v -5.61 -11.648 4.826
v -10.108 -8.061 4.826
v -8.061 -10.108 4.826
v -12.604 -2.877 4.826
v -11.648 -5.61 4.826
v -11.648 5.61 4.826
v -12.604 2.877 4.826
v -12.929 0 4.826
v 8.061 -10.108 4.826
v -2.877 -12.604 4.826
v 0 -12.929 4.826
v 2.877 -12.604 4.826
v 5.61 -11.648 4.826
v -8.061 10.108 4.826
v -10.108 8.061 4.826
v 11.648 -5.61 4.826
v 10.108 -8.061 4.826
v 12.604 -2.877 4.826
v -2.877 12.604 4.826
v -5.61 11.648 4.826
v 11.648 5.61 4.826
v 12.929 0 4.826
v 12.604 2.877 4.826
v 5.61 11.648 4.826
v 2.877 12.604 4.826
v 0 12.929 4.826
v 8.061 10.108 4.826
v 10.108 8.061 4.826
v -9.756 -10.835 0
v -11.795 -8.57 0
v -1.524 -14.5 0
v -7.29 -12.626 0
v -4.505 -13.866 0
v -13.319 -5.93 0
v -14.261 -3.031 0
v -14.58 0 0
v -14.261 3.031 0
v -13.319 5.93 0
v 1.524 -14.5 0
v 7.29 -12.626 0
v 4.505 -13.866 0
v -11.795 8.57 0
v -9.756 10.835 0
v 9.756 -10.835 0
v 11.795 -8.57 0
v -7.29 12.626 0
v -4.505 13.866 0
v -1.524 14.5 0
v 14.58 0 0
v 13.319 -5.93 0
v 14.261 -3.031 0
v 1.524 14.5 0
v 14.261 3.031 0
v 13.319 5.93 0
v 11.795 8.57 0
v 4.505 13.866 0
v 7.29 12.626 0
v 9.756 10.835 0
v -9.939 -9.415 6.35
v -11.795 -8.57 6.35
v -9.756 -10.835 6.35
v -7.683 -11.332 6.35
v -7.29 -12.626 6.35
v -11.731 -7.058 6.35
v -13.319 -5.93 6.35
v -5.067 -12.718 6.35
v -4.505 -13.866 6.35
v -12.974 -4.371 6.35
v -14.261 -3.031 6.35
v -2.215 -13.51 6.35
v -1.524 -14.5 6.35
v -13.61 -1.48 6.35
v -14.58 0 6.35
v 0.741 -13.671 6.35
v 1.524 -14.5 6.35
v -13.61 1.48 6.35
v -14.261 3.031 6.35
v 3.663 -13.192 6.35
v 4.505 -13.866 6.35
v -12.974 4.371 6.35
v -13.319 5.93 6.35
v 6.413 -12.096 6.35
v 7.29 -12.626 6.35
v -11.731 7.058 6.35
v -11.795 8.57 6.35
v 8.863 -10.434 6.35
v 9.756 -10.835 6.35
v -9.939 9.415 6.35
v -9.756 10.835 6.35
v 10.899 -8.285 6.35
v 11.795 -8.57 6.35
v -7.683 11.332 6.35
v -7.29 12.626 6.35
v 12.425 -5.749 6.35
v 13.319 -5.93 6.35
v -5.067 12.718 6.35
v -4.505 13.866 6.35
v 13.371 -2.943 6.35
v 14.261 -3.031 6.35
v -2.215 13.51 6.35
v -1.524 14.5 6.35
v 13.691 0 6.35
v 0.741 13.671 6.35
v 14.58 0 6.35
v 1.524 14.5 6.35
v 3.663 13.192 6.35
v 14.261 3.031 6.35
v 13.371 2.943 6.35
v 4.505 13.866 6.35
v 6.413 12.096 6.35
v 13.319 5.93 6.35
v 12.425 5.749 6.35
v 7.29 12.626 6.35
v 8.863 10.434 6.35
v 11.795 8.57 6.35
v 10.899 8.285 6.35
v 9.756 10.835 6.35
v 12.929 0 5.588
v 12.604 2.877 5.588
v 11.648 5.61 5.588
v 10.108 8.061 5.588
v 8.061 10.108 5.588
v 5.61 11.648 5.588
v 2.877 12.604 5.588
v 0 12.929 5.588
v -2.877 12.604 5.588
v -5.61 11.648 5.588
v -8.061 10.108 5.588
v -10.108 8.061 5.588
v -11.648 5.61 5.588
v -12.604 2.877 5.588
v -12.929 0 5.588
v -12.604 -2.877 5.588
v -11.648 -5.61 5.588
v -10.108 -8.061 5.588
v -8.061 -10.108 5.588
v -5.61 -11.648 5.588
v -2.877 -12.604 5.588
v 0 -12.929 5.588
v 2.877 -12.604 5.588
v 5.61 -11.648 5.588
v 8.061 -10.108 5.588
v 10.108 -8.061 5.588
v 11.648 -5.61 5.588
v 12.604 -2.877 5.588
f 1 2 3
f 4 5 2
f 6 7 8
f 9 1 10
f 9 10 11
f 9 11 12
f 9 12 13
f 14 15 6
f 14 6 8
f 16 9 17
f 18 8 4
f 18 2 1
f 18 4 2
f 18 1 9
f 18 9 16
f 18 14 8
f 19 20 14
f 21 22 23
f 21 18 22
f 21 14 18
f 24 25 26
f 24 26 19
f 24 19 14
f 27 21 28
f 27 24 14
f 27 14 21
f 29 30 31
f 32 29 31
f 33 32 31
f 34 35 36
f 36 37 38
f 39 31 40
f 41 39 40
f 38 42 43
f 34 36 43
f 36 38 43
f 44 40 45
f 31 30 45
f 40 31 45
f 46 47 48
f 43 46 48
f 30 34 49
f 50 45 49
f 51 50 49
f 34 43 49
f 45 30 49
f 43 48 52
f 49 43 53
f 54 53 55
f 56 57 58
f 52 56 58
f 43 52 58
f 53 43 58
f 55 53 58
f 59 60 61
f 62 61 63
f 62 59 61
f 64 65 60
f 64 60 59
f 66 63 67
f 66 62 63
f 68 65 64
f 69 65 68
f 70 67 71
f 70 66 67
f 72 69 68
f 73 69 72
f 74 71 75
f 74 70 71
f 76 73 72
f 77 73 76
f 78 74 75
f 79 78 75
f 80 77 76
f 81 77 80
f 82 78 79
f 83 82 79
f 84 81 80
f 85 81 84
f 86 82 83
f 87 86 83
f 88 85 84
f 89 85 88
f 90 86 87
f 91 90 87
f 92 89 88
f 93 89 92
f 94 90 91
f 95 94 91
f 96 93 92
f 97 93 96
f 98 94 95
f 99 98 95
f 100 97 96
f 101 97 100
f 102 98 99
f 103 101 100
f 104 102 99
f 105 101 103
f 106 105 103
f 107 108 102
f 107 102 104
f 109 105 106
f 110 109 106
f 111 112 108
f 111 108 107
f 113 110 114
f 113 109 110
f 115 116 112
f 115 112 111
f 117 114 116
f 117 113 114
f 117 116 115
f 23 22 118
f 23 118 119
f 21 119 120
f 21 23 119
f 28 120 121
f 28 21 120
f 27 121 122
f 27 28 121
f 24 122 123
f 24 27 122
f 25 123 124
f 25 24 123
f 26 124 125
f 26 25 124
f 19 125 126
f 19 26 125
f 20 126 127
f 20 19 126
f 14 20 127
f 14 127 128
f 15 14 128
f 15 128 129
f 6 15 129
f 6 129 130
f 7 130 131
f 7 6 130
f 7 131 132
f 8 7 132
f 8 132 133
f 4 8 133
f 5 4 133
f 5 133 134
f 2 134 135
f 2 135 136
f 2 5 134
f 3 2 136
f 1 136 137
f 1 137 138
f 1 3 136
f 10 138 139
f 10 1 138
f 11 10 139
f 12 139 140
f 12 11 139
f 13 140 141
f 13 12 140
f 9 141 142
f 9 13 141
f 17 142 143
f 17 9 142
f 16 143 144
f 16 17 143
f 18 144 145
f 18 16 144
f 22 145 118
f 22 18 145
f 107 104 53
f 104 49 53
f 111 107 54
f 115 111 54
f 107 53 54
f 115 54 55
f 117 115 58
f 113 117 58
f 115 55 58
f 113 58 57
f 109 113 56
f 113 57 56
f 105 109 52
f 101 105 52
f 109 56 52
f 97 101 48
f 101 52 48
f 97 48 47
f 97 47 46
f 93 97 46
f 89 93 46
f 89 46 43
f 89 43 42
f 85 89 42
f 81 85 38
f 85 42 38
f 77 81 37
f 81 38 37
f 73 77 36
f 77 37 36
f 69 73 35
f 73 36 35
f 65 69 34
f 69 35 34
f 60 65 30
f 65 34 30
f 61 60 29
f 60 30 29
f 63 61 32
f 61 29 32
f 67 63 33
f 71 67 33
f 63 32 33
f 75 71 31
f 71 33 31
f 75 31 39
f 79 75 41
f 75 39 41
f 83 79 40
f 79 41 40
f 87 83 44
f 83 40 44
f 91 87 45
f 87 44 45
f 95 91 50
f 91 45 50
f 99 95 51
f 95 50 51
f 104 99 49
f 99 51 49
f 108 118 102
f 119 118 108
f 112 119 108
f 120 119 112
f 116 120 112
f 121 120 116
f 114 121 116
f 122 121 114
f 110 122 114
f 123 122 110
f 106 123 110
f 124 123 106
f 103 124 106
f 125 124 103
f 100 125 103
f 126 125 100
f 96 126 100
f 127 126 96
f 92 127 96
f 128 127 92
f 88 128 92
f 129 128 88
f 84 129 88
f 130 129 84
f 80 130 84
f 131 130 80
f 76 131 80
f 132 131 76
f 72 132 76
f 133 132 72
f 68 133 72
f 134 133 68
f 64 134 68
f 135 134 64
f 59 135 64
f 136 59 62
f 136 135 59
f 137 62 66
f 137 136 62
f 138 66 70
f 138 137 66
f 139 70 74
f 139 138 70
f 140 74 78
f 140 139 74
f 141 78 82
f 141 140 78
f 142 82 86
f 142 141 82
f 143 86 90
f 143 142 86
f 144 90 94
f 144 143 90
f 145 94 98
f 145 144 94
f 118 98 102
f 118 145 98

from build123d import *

# Parameters (mm, degrees)
F0_R     = 14.5796
F1_DEPTH = 4.826
F2_R     = 14.5796
F2_R_2   = 12.9286
F3_DEPTH = 1.524
F4_SIZE  = 0.762


with BuildPart() as f1:
    # F0 (on Top) → F1 (new body)
    with BuildSketch(Plane.XY):
        Circle(F0_R)
    extrude(amount=F1_DEPTH)

    # F2 (on face) → F3 (join)
    with BuildSketch(Plane.XY.offset(4.826)):
        Circle(F2_R)
        Circle(F2_R_2, mode=Mode.SUBTRACT)
    extrude(amount=F3_DEPTH)

    # F4
    f4_edges = [f1.edges().sort_by_distance(p)[0] for p in [
        (-12.9286, 0, 6.35),
    ]]
    chamfer(f4_edges, length=F4_SIZE)


solid = f1.part
